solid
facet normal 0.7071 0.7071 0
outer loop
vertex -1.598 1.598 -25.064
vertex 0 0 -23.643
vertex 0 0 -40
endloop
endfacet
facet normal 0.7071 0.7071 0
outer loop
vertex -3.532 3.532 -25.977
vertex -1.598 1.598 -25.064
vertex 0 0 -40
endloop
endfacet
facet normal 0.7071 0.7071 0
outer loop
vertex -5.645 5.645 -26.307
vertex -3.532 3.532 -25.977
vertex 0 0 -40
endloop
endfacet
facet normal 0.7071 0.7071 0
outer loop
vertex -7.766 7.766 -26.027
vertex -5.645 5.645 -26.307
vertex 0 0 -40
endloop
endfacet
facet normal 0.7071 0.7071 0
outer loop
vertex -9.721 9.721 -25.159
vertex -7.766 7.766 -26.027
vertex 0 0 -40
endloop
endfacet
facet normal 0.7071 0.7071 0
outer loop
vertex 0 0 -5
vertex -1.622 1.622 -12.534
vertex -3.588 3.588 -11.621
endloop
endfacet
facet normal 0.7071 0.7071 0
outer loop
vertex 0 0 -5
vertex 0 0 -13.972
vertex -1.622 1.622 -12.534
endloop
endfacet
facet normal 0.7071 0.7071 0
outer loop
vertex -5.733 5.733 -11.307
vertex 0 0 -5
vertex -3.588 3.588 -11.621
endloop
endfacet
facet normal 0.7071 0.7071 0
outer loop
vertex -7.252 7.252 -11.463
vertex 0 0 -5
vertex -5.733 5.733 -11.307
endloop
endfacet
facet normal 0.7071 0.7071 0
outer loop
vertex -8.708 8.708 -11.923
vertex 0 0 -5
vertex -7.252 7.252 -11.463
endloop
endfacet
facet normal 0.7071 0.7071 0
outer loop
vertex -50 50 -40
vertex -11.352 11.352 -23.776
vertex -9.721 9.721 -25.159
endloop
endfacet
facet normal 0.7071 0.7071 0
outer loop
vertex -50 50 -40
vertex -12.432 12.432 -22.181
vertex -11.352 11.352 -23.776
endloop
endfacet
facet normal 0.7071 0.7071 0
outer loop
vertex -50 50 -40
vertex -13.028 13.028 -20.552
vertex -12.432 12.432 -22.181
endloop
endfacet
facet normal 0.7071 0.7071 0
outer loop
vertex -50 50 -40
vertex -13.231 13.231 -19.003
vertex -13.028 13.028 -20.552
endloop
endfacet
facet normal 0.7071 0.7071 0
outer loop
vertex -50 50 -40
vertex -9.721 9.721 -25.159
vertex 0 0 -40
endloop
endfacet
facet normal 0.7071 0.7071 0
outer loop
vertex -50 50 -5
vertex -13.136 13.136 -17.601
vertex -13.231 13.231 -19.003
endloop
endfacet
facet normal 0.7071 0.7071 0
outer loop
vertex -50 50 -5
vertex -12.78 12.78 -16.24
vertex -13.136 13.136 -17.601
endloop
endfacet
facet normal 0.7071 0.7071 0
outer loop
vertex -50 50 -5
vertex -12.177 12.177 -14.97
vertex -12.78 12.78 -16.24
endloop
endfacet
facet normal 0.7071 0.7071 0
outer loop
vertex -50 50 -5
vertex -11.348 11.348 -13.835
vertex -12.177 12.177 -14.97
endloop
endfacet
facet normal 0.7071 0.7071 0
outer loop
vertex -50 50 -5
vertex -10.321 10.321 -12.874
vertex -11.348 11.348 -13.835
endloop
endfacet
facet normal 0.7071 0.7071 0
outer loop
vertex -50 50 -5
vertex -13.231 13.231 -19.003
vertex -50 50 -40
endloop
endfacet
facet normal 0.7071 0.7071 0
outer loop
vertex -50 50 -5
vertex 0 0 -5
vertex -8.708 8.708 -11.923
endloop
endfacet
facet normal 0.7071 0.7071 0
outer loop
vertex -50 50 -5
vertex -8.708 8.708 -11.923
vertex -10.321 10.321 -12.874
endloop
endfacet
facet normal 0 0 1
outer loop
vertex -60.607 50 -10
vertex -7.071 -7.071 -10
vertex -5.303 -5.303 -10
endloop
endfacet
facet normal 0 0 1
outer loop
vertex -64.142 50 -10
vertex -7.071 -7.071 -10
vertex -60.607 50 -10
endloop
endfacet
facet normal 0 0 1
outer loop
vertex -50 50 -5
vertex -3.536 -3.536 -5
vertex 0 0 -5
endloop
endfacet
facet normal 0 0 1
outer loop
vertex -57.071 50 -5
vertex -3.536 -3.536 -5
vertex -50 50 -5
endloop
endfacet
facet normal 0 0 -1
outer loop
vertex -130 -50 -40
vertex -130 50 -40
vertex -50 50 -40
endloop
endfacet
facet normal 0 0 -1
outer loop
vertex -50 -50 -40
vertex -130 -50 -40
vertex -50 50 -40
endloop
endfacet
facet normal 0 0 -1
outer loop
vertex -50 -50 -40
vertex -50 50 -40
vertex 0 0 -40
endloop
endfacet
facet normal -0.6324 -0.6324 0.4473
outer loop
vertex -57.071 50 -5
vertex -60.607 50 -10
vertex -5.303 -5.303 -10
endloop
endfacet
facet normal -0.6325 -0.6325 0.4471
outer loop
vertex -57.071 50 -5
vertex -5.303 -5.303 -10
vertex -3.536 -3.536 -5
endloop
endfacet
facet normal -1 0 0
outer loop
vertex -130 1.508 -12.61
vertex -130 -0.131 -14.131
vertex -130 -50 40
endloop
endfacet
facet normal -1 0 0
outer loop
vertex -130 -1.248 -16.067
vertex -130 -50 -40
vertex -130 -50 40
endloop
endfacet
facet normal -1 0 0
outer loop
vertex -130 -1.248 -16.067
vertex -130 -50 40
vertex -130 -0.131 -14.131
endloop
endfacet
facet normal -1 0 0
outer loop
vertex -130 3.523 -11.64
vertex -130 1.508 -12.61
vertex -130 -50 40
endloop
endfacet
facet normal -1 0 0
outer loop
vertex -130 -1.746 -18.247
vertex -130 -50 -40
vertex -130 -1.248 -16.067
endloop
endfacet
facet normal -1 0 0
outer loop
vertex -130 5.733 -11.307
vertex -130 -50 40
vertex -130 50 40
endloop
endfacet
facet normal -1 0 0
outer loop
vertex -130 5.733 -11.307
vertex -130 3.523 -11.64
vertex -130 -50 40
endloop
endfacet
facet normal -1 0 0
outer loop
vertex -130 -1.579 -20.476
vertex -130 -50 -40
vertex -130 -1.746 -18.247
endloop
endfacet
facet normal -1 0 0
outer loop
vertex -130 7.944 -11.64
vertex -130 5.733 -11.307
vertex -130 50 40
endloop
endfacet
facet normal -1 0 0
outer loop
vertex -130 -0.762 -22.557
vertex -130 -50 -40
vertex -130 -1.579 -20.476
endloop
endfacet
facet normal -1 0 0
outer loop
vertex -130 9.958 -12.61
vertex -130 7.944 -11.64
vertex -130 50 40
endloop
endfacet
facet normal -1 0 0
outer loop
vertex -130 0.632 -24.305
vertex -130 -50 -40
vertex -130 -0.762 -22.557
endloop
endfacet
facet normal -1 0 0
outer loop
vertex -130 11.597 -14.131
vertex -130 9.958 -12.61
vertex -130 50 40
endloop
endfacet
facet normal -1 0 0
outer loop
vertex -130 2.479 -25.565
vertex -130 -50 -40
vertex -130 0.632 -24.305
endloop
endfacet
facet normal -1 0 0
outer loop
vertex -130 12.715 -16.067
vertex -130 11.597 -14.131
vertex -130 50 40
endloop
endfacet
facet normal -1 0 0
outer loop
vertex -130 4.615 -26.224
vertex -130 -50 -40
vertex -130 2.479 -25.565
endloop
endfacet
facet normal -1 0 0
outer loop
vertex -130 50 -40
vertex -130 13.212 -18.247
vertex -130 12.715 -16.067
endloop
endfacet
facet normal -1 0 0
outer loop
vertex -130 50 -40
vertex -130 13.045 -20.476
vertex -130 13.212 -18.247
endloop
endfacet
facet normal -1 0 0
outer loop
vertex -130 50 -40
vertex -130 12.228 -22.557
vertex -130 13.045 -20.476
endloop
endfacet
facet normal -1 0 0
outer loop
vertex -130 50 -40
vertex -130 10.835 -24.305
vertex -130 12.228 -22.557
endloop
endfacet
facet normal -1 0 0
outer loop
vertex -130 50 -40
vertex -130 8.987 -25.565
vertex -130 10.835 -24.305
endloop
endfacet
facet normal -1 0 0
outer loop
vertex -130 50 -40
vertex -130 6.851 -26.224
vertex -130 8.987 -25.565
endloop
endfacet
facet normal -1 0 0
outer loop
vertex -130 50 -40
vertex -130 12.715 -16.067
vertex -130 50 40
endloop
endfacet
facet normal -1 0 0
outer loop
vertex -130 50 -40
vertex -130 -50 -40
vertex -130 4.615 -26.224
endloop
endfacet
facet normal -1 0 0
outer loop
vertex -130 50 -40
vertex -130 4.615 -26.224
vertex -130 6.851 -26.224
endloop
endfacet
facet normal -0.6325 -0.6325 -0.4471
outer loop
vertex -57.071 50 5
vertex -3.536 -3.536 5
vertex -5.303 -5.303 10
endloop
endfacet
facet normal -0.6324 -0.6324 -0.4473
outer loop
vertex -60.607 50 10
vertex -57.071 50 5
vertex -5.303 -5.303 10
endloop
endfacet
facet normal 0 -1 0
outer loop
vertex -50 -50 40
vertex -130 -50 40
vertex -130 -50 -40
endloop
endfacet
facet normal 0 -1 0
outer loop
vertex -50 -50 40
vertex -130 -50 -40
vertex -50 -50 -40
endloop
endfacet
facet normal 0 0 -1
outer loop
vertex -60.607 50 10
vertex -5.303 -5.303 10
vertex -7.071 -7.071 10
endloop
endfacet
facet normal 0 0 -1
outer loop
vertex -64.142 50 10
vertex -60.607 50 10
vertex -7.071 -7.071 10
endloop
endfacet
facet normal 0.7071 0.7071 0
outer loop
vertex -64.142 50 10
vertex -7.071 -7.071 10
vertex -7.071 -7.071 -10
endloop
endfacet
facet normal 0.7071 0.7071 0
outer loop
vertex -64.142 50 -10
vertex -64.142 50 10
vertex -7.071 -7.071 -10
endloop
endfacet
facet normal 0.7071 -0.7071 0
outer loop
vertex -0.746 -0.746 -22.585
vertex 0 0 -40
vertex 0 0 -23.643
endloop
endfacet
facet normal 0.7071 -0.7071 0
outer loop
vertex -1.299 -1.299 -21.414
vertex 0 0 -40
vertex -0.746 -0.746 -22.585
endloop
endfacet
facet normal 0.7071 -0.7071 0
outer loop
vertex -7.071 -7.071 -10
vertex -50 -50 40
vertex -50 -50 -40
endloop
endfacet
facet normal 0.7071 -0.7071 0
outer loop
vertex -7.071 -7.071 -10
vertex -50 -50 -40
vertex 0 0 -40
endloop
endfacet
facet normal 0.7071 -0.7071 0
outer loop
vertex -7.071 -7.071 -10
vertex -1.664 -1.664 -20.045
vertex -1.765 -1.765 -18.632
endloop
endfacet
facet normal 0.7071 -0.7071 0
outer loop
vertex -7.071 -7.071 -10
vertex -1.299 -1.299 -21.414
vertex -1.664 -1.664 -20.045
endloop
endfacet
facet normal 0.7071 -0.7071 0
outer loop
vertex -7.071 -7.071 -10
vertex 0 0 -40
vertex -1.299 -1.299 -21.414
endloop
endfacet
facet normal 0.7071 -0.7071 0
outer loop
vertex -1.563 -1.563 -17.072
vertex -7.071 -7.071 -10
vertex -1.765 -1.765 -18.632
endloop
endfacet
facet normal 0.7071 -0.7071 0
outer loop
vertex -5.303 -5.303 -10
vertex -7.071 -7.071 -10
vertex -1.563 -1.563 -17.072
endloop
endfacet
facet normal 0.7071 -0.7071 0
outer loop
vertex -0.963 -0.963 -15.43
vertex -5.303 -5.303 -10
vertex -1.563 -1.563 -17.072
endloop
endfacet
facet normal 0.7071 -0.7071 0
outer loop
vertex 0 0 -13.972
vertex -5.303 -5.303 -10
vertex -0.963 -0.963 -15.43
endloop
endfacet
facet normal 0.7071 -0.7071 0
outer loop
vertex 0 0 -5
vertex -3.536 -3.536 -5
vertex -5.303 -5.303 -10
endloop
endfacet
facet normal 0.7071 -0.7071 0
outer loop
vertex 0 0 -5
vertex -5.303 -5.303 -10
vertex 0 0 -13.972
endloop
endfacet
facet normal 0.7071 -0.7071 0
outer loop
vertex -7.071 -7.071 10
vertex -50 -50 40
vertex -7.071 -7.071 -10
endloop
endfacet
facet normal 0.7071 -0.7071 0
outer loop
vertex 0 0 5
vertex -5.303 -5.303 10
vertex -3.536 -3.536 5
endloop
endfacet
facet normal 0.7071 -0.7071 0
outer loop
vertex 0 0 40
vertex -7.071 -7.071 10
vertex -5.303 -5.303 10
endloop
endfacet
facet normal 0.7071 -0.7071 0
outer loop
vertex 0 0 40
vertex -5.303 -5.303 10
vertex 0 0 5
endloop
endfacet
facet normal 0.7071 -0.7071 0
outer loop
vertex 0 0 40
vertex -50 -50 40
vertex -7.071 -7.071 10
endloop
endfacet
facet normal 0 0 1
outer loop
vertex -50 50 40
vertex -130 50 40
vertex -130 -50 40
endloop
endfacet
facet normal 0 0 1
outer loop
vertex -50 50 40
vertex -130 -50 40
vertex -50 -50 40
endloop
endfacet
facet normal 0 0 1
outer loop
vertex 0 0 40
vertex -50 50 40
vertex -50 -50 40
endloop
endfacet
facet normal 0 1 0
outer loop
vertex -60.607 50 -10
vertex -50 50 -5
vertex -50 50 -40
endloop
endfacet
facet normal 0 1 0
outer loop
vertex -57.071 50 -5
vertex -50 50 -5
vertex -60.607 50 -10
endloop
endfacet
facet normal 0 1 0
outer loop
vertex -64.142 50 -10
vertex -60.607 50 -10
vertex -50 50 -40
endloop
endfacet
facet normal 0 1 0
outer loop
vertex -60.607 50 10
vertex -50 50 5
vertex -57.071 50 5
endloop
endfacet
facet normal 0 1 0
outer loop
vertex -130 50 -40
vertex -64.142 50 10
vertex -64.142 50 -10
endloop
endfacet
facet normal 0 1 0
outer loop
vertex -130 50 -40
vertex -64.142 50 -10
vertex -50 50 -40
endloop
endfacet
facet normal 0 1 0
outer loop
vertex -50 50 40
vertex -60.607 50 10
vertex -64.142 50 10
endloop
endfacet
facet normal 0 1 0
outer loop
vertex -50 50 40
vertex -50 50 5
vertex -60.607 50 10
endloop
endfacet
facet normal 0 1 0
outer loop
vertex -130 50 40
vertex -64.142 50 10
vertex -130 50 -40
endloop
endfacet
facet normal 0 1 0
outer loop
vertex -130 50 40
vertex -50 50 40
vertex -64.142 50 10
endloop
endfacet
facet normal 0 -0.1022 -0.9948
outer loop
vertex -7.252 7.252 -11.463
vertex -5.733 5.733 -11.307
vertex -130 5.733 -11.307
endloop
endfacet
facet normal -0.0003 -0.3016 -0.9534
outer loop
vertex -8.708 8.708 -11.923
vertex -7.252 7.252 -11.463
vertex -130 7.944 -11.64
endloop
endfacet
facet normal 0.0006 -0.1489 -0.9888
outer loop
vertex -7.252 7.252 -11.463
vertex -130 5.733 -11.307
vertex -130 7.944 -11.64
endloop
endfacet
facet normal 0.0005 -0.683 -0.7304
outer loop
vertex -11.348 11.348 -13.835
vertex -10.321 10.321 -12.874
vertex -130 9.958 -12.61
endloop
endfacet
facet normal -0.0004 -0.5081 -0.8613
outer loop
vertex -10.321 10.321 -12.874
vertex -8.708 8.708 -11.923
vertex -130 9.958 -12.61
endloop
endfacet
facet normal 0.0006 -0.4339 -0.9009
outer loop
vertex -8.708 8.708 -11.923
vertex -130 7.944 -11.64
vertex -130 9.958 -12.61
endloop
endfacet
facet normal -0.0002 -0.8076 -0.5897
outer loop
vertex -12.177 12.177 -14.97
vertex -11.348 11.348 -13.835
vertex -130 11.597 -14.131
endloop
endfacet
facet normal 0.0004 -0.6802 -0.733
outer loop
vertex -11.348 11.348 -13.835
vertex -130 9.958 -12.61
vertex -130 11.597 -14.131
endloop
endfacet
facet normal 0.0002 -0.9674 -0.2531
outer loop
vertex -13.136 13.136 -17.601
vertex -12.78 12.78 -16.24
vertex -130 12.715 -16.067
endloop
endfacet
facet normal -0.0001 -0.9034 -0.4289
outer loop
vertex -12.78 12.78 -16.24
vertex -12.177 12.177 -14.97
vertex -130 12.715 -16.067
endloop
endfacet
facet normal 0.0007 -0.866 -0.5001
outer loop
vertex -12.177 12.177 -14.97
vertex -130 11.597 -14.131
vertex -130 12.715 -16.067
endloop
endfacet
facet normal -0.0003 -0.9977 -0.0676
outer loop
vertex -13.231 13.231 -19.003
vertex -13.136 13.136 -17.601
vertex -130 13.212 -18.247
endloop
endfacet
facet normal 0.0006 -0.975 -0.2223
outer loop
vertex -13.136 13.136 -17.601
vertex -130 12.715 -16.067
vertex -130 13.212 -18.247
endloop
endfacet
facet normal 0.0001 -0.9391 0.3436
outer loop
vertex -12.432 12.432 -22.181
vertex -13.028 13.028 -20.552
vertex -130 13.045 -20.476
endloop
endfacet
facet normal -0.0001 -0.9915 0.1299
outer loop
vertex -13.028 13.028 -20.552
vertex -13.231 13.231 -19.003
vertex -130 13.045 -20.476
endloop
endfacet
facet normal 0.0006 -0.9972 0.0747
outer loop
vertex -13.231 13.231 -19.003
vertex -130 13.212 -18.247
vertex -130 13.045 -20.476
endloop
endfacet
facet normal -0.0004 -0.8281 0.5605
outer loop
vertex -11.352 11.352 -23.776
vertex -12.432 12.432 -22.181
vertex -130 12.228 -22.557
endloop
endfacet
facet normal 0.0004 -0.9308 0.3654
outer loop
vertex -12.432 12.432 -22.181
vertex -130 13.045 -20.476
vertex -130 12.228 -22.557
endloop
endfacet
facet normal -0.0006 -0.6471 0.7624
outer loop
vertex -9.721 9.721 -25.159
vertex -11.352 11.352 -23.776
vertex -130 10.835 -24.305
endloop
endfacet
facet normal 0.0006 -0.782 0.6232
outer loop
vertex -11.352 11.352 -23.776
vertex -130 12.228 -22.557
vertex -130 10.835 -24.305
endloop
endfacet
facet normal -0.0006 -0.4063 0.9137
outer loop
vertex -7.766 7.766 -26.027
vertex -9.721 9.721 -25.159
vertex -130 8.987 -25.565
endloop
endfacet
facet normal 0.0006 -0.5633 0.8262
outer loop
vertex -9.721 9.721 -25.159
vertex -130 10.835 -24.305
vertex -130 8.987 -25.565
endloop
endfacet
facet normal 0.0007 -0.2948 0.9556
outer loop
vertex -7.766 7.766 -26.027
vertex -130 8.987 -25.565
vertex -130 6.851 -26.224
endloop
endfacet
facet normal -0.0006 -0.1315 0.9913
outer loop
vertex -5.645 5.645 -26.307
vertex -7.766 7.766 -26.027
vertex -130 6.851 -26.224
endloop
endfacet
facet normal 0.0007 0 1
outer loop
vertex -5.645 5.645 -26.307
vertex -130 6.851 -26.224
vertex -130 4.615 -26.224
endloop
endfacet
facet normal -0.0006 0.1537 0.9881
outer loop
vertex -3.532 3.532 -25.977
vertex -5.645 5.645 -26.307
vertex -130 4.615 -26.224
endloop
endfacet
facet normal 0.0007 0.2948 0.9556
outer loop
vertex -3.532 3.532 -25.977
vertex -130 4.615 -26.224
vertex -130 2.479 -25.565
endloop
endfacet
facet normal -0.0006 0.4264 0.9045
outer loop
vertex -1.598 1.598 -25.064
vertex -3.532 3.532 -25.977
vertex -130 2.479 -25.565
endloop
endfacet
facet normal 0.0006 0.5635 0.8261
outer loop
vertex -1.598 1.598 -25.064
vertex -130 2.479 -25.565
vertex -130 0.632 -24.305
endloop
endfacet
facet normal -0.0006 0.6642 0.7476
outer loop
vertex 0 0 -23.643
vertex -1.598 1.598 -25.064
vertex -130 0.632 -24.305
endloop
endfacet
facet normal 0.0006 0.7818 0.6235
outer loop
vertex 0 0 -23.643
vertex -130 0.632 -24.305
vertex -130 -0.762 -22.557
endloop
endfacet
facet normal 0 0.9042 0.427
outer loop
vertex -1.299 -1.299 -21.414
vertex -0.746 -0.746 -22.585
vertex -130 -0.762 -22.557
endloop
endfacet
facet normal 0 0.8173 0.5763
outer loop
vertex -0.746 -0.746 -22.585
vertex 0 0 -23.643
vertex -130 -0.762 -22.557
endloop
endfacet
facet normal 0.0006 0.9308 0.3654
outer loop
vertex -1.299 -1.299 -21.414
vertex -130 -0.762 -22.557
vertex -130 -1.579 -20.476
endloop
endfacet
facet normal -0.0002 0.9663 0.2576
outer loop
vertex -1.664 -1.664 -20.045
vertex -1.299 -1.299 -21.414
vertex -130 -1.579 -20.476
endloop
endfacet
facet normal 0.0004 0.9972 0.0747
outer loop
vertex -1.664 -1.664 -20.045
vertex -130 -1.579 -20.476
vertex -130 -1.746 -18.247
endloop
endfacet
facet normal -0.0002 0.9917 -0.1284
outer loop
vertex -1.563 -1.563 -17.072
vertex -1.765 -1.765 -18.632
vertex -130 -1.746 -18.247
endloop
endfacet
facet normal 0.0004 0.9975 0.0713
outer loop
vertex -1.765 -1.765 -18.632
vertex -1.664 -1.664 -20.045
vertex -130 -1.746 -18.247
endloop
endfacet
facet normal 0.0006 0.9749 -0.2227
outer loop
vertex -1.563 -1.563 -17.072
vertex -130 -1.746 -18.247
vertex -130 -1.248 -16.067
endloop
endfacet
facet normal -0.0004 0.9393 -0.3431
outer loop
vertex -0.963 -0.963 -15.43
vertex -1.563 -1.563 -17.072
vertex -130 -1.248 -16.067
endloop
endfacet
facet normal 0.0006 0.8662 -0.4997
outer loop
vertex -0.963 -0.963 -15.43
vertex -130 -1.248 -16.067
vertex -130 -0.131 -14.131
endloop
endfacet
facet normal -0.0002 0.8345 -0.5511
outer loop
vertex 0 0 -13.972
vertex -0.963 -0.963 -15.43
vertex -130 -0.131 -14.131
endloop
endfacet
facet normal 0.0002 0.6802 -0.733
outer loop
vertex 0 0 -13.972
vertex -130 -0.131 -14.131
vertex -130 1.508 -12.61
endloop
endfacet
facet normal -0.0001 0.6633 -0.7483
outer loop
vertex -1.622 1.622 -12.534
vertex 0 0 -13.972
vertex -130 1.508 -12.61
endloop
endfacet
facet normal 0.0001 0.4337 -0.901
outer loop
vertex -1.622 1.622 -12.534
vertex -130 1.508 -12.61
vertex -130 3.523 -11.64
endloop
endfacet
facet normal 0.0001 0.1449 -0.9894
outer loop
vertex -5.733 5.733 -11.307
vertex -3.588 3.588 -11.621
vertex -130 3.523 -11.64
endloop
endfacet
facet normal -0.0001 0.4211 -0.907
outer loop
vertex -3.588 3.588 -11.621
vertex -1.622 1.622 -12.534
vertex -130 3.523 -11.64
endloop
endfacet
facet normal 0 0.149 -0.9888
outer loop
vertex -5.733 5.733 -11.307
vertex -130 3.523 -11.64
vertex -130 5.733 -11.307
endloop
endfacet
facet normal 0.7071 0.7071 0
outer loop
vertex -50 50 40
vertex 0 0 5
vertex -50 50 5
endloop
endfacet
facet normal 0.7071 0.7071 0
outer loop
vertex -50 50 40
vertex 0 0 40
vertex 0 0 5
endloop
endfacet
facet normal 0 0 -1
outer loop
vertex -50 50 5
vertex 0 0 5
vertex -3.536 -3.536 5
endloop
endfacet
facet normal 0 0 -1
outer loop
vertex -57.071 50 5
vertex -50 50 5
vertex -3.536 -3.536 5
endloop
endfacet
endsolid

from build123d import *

# Parameters (mm, degrees)
EXTRUDE_1_DEPTH          = 40
SKETCH_2_R               = 7.5
CUT_EXTRUDE_1_DEPTH      = 154.948043183
CUT_EXTRUDE_2_DEPTH      = 141.356688476
CUT_EXTRUDE_2_DEPTH_BACK = 141.356688476
CUT_EXTRUDE_3_DEPTH      = 169.819430161
CUT_EXTRUDE_3_DEPTH_BACK = 169.819430161
SKETCH_4_W               = 39.056064152
SKETCH_4_H               = 128.107121435


with BuildPart() as part:
    # 草图1 → 凸台-拉伸1 (new, symmetric)
    with BuildSketch(Plane.XY):
        Polygon((-140, 50), (-140, -50), (-50, -50), (0, 0), (-50, 50), align=None)
    extrude(amount=EXTRUDE_1_DEPTH, both=True)

    # 草图2 → 切除-拉伸1 (cut, through all)
    with BuildSketch(Plane.ZY.offset(140)):
        with Locations((-18.807269804, 5.733234466)):
            Circle(SKETCH_2_R)
    extrude(amount=-CUT_EXTRUDE_1_DEPTH, mode=Mode.SUBTRACT)

    # 草图3 → 切除-拉伸2 (cut, two sides: drawn at the far end of the back side and taken through both)
    with BuildSketch(Plane(origin=(-50, 50, 0), x_dir=(0, 0, -1), z_dir=(0.7071067811865509, -0.7071067811865441, 0)).offset(-CUT_EXTRUDE_2_DEPTH_BACK)):
        Polygon((5, 5), (-5, 5), (-5, -5), (-10, -7.5), (-10, -10), (10, -10), (10, -7.5), (5, -5), align=None)
    extrude(amount=CUT_EXTRUDE_2_DEPTH + CUT_EXTRUDE_2_DEPTH_BACK, mode=Mode.SUBTRACT)

    # 草图4 → 切除-拉伸3 (cut, two sides: drawn at the far end of the back side and taken through both)
    with BuildSketch(Plane.XY.offset(40).offset(-CUT_EXTRUDE_3_DEPTH_BACK)):
        with Locations((-149.528032076, -5.637932913)):
            Rectangle(SKETCH_4_W, SKETCH_4_H)
    extrude(amount=CUT_EXTRUDE_3_DEPTH + CUT_EXTRUDE_3_DEPTH_BACK, mode=Mode.SUBTRACT)


solid = part.part
